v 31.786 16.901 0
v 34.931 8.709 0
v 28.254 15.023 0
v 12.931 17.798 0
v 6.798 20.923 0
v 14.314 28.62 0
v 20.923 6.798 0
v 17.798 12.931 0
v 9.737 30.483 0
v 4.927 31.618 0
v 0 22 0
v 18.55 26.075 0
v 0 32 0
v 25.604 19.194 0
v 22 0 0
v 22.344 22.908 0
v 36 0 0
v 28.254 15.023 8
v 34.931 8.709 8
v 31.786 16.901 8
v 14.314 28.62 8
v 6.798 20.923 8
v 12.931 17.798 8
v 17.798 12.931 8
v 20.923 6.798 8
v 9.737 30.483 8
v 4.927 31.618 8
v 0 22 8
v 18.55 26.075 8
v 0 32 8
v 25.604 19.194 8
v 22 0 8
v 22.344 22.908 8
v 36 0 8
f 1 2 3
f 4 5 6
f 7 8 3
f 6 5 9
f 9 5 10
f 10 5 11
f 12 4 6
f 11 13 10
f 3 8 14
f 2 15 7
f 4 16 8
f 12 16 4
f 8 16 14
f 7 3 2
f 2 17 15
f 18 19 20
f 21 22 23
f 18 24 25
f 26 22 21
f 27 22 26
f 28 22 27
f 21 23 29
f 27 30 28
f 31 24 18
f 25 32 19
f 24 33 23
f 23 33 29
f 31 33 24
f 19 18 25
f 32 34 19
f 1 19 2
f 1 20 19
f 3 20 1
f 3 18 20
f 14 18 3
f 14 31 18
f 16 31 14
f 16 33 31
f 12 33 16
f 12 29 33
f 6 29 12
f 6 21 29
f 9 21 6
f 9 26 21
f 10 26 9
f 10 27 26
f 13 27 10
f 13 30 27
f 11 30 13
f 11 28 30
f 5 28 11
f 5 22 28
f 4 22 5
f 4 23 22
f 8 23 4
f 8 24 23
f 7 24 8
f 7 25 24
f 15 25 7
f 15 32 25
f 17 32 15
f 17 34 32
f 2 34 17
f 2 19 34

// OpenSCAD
$fn = 32;

// ----------------------------------------------------------------------
// Arc stop: segment, 8 mm thick
// ----------------------------------------------------------------------

// --- parameters (mm) ---
profile_height = 8;       // extrusion height
profile_points = 17;      // points of the closed outline

profile = [[36, 0], [34.931, 8.709], [31.786, 16.901], [28.254, 15.023], [25.604, 19.194], [22.344, 22.908], [18.55, 26.075], [14.314, 28.62], [9.737, 30.483], [4.927, 31.618], [0, 32], [0, 22], [6.798, 20.923], [12.931, 17.798], [17.798, 12.931], [20.923, 6.798], [22, 0]];  // single closed polygon, 17 points, counter clockwise

// --- the one profile operation ---
linear_extrude(height = profile_height) polygon(points = profile);
